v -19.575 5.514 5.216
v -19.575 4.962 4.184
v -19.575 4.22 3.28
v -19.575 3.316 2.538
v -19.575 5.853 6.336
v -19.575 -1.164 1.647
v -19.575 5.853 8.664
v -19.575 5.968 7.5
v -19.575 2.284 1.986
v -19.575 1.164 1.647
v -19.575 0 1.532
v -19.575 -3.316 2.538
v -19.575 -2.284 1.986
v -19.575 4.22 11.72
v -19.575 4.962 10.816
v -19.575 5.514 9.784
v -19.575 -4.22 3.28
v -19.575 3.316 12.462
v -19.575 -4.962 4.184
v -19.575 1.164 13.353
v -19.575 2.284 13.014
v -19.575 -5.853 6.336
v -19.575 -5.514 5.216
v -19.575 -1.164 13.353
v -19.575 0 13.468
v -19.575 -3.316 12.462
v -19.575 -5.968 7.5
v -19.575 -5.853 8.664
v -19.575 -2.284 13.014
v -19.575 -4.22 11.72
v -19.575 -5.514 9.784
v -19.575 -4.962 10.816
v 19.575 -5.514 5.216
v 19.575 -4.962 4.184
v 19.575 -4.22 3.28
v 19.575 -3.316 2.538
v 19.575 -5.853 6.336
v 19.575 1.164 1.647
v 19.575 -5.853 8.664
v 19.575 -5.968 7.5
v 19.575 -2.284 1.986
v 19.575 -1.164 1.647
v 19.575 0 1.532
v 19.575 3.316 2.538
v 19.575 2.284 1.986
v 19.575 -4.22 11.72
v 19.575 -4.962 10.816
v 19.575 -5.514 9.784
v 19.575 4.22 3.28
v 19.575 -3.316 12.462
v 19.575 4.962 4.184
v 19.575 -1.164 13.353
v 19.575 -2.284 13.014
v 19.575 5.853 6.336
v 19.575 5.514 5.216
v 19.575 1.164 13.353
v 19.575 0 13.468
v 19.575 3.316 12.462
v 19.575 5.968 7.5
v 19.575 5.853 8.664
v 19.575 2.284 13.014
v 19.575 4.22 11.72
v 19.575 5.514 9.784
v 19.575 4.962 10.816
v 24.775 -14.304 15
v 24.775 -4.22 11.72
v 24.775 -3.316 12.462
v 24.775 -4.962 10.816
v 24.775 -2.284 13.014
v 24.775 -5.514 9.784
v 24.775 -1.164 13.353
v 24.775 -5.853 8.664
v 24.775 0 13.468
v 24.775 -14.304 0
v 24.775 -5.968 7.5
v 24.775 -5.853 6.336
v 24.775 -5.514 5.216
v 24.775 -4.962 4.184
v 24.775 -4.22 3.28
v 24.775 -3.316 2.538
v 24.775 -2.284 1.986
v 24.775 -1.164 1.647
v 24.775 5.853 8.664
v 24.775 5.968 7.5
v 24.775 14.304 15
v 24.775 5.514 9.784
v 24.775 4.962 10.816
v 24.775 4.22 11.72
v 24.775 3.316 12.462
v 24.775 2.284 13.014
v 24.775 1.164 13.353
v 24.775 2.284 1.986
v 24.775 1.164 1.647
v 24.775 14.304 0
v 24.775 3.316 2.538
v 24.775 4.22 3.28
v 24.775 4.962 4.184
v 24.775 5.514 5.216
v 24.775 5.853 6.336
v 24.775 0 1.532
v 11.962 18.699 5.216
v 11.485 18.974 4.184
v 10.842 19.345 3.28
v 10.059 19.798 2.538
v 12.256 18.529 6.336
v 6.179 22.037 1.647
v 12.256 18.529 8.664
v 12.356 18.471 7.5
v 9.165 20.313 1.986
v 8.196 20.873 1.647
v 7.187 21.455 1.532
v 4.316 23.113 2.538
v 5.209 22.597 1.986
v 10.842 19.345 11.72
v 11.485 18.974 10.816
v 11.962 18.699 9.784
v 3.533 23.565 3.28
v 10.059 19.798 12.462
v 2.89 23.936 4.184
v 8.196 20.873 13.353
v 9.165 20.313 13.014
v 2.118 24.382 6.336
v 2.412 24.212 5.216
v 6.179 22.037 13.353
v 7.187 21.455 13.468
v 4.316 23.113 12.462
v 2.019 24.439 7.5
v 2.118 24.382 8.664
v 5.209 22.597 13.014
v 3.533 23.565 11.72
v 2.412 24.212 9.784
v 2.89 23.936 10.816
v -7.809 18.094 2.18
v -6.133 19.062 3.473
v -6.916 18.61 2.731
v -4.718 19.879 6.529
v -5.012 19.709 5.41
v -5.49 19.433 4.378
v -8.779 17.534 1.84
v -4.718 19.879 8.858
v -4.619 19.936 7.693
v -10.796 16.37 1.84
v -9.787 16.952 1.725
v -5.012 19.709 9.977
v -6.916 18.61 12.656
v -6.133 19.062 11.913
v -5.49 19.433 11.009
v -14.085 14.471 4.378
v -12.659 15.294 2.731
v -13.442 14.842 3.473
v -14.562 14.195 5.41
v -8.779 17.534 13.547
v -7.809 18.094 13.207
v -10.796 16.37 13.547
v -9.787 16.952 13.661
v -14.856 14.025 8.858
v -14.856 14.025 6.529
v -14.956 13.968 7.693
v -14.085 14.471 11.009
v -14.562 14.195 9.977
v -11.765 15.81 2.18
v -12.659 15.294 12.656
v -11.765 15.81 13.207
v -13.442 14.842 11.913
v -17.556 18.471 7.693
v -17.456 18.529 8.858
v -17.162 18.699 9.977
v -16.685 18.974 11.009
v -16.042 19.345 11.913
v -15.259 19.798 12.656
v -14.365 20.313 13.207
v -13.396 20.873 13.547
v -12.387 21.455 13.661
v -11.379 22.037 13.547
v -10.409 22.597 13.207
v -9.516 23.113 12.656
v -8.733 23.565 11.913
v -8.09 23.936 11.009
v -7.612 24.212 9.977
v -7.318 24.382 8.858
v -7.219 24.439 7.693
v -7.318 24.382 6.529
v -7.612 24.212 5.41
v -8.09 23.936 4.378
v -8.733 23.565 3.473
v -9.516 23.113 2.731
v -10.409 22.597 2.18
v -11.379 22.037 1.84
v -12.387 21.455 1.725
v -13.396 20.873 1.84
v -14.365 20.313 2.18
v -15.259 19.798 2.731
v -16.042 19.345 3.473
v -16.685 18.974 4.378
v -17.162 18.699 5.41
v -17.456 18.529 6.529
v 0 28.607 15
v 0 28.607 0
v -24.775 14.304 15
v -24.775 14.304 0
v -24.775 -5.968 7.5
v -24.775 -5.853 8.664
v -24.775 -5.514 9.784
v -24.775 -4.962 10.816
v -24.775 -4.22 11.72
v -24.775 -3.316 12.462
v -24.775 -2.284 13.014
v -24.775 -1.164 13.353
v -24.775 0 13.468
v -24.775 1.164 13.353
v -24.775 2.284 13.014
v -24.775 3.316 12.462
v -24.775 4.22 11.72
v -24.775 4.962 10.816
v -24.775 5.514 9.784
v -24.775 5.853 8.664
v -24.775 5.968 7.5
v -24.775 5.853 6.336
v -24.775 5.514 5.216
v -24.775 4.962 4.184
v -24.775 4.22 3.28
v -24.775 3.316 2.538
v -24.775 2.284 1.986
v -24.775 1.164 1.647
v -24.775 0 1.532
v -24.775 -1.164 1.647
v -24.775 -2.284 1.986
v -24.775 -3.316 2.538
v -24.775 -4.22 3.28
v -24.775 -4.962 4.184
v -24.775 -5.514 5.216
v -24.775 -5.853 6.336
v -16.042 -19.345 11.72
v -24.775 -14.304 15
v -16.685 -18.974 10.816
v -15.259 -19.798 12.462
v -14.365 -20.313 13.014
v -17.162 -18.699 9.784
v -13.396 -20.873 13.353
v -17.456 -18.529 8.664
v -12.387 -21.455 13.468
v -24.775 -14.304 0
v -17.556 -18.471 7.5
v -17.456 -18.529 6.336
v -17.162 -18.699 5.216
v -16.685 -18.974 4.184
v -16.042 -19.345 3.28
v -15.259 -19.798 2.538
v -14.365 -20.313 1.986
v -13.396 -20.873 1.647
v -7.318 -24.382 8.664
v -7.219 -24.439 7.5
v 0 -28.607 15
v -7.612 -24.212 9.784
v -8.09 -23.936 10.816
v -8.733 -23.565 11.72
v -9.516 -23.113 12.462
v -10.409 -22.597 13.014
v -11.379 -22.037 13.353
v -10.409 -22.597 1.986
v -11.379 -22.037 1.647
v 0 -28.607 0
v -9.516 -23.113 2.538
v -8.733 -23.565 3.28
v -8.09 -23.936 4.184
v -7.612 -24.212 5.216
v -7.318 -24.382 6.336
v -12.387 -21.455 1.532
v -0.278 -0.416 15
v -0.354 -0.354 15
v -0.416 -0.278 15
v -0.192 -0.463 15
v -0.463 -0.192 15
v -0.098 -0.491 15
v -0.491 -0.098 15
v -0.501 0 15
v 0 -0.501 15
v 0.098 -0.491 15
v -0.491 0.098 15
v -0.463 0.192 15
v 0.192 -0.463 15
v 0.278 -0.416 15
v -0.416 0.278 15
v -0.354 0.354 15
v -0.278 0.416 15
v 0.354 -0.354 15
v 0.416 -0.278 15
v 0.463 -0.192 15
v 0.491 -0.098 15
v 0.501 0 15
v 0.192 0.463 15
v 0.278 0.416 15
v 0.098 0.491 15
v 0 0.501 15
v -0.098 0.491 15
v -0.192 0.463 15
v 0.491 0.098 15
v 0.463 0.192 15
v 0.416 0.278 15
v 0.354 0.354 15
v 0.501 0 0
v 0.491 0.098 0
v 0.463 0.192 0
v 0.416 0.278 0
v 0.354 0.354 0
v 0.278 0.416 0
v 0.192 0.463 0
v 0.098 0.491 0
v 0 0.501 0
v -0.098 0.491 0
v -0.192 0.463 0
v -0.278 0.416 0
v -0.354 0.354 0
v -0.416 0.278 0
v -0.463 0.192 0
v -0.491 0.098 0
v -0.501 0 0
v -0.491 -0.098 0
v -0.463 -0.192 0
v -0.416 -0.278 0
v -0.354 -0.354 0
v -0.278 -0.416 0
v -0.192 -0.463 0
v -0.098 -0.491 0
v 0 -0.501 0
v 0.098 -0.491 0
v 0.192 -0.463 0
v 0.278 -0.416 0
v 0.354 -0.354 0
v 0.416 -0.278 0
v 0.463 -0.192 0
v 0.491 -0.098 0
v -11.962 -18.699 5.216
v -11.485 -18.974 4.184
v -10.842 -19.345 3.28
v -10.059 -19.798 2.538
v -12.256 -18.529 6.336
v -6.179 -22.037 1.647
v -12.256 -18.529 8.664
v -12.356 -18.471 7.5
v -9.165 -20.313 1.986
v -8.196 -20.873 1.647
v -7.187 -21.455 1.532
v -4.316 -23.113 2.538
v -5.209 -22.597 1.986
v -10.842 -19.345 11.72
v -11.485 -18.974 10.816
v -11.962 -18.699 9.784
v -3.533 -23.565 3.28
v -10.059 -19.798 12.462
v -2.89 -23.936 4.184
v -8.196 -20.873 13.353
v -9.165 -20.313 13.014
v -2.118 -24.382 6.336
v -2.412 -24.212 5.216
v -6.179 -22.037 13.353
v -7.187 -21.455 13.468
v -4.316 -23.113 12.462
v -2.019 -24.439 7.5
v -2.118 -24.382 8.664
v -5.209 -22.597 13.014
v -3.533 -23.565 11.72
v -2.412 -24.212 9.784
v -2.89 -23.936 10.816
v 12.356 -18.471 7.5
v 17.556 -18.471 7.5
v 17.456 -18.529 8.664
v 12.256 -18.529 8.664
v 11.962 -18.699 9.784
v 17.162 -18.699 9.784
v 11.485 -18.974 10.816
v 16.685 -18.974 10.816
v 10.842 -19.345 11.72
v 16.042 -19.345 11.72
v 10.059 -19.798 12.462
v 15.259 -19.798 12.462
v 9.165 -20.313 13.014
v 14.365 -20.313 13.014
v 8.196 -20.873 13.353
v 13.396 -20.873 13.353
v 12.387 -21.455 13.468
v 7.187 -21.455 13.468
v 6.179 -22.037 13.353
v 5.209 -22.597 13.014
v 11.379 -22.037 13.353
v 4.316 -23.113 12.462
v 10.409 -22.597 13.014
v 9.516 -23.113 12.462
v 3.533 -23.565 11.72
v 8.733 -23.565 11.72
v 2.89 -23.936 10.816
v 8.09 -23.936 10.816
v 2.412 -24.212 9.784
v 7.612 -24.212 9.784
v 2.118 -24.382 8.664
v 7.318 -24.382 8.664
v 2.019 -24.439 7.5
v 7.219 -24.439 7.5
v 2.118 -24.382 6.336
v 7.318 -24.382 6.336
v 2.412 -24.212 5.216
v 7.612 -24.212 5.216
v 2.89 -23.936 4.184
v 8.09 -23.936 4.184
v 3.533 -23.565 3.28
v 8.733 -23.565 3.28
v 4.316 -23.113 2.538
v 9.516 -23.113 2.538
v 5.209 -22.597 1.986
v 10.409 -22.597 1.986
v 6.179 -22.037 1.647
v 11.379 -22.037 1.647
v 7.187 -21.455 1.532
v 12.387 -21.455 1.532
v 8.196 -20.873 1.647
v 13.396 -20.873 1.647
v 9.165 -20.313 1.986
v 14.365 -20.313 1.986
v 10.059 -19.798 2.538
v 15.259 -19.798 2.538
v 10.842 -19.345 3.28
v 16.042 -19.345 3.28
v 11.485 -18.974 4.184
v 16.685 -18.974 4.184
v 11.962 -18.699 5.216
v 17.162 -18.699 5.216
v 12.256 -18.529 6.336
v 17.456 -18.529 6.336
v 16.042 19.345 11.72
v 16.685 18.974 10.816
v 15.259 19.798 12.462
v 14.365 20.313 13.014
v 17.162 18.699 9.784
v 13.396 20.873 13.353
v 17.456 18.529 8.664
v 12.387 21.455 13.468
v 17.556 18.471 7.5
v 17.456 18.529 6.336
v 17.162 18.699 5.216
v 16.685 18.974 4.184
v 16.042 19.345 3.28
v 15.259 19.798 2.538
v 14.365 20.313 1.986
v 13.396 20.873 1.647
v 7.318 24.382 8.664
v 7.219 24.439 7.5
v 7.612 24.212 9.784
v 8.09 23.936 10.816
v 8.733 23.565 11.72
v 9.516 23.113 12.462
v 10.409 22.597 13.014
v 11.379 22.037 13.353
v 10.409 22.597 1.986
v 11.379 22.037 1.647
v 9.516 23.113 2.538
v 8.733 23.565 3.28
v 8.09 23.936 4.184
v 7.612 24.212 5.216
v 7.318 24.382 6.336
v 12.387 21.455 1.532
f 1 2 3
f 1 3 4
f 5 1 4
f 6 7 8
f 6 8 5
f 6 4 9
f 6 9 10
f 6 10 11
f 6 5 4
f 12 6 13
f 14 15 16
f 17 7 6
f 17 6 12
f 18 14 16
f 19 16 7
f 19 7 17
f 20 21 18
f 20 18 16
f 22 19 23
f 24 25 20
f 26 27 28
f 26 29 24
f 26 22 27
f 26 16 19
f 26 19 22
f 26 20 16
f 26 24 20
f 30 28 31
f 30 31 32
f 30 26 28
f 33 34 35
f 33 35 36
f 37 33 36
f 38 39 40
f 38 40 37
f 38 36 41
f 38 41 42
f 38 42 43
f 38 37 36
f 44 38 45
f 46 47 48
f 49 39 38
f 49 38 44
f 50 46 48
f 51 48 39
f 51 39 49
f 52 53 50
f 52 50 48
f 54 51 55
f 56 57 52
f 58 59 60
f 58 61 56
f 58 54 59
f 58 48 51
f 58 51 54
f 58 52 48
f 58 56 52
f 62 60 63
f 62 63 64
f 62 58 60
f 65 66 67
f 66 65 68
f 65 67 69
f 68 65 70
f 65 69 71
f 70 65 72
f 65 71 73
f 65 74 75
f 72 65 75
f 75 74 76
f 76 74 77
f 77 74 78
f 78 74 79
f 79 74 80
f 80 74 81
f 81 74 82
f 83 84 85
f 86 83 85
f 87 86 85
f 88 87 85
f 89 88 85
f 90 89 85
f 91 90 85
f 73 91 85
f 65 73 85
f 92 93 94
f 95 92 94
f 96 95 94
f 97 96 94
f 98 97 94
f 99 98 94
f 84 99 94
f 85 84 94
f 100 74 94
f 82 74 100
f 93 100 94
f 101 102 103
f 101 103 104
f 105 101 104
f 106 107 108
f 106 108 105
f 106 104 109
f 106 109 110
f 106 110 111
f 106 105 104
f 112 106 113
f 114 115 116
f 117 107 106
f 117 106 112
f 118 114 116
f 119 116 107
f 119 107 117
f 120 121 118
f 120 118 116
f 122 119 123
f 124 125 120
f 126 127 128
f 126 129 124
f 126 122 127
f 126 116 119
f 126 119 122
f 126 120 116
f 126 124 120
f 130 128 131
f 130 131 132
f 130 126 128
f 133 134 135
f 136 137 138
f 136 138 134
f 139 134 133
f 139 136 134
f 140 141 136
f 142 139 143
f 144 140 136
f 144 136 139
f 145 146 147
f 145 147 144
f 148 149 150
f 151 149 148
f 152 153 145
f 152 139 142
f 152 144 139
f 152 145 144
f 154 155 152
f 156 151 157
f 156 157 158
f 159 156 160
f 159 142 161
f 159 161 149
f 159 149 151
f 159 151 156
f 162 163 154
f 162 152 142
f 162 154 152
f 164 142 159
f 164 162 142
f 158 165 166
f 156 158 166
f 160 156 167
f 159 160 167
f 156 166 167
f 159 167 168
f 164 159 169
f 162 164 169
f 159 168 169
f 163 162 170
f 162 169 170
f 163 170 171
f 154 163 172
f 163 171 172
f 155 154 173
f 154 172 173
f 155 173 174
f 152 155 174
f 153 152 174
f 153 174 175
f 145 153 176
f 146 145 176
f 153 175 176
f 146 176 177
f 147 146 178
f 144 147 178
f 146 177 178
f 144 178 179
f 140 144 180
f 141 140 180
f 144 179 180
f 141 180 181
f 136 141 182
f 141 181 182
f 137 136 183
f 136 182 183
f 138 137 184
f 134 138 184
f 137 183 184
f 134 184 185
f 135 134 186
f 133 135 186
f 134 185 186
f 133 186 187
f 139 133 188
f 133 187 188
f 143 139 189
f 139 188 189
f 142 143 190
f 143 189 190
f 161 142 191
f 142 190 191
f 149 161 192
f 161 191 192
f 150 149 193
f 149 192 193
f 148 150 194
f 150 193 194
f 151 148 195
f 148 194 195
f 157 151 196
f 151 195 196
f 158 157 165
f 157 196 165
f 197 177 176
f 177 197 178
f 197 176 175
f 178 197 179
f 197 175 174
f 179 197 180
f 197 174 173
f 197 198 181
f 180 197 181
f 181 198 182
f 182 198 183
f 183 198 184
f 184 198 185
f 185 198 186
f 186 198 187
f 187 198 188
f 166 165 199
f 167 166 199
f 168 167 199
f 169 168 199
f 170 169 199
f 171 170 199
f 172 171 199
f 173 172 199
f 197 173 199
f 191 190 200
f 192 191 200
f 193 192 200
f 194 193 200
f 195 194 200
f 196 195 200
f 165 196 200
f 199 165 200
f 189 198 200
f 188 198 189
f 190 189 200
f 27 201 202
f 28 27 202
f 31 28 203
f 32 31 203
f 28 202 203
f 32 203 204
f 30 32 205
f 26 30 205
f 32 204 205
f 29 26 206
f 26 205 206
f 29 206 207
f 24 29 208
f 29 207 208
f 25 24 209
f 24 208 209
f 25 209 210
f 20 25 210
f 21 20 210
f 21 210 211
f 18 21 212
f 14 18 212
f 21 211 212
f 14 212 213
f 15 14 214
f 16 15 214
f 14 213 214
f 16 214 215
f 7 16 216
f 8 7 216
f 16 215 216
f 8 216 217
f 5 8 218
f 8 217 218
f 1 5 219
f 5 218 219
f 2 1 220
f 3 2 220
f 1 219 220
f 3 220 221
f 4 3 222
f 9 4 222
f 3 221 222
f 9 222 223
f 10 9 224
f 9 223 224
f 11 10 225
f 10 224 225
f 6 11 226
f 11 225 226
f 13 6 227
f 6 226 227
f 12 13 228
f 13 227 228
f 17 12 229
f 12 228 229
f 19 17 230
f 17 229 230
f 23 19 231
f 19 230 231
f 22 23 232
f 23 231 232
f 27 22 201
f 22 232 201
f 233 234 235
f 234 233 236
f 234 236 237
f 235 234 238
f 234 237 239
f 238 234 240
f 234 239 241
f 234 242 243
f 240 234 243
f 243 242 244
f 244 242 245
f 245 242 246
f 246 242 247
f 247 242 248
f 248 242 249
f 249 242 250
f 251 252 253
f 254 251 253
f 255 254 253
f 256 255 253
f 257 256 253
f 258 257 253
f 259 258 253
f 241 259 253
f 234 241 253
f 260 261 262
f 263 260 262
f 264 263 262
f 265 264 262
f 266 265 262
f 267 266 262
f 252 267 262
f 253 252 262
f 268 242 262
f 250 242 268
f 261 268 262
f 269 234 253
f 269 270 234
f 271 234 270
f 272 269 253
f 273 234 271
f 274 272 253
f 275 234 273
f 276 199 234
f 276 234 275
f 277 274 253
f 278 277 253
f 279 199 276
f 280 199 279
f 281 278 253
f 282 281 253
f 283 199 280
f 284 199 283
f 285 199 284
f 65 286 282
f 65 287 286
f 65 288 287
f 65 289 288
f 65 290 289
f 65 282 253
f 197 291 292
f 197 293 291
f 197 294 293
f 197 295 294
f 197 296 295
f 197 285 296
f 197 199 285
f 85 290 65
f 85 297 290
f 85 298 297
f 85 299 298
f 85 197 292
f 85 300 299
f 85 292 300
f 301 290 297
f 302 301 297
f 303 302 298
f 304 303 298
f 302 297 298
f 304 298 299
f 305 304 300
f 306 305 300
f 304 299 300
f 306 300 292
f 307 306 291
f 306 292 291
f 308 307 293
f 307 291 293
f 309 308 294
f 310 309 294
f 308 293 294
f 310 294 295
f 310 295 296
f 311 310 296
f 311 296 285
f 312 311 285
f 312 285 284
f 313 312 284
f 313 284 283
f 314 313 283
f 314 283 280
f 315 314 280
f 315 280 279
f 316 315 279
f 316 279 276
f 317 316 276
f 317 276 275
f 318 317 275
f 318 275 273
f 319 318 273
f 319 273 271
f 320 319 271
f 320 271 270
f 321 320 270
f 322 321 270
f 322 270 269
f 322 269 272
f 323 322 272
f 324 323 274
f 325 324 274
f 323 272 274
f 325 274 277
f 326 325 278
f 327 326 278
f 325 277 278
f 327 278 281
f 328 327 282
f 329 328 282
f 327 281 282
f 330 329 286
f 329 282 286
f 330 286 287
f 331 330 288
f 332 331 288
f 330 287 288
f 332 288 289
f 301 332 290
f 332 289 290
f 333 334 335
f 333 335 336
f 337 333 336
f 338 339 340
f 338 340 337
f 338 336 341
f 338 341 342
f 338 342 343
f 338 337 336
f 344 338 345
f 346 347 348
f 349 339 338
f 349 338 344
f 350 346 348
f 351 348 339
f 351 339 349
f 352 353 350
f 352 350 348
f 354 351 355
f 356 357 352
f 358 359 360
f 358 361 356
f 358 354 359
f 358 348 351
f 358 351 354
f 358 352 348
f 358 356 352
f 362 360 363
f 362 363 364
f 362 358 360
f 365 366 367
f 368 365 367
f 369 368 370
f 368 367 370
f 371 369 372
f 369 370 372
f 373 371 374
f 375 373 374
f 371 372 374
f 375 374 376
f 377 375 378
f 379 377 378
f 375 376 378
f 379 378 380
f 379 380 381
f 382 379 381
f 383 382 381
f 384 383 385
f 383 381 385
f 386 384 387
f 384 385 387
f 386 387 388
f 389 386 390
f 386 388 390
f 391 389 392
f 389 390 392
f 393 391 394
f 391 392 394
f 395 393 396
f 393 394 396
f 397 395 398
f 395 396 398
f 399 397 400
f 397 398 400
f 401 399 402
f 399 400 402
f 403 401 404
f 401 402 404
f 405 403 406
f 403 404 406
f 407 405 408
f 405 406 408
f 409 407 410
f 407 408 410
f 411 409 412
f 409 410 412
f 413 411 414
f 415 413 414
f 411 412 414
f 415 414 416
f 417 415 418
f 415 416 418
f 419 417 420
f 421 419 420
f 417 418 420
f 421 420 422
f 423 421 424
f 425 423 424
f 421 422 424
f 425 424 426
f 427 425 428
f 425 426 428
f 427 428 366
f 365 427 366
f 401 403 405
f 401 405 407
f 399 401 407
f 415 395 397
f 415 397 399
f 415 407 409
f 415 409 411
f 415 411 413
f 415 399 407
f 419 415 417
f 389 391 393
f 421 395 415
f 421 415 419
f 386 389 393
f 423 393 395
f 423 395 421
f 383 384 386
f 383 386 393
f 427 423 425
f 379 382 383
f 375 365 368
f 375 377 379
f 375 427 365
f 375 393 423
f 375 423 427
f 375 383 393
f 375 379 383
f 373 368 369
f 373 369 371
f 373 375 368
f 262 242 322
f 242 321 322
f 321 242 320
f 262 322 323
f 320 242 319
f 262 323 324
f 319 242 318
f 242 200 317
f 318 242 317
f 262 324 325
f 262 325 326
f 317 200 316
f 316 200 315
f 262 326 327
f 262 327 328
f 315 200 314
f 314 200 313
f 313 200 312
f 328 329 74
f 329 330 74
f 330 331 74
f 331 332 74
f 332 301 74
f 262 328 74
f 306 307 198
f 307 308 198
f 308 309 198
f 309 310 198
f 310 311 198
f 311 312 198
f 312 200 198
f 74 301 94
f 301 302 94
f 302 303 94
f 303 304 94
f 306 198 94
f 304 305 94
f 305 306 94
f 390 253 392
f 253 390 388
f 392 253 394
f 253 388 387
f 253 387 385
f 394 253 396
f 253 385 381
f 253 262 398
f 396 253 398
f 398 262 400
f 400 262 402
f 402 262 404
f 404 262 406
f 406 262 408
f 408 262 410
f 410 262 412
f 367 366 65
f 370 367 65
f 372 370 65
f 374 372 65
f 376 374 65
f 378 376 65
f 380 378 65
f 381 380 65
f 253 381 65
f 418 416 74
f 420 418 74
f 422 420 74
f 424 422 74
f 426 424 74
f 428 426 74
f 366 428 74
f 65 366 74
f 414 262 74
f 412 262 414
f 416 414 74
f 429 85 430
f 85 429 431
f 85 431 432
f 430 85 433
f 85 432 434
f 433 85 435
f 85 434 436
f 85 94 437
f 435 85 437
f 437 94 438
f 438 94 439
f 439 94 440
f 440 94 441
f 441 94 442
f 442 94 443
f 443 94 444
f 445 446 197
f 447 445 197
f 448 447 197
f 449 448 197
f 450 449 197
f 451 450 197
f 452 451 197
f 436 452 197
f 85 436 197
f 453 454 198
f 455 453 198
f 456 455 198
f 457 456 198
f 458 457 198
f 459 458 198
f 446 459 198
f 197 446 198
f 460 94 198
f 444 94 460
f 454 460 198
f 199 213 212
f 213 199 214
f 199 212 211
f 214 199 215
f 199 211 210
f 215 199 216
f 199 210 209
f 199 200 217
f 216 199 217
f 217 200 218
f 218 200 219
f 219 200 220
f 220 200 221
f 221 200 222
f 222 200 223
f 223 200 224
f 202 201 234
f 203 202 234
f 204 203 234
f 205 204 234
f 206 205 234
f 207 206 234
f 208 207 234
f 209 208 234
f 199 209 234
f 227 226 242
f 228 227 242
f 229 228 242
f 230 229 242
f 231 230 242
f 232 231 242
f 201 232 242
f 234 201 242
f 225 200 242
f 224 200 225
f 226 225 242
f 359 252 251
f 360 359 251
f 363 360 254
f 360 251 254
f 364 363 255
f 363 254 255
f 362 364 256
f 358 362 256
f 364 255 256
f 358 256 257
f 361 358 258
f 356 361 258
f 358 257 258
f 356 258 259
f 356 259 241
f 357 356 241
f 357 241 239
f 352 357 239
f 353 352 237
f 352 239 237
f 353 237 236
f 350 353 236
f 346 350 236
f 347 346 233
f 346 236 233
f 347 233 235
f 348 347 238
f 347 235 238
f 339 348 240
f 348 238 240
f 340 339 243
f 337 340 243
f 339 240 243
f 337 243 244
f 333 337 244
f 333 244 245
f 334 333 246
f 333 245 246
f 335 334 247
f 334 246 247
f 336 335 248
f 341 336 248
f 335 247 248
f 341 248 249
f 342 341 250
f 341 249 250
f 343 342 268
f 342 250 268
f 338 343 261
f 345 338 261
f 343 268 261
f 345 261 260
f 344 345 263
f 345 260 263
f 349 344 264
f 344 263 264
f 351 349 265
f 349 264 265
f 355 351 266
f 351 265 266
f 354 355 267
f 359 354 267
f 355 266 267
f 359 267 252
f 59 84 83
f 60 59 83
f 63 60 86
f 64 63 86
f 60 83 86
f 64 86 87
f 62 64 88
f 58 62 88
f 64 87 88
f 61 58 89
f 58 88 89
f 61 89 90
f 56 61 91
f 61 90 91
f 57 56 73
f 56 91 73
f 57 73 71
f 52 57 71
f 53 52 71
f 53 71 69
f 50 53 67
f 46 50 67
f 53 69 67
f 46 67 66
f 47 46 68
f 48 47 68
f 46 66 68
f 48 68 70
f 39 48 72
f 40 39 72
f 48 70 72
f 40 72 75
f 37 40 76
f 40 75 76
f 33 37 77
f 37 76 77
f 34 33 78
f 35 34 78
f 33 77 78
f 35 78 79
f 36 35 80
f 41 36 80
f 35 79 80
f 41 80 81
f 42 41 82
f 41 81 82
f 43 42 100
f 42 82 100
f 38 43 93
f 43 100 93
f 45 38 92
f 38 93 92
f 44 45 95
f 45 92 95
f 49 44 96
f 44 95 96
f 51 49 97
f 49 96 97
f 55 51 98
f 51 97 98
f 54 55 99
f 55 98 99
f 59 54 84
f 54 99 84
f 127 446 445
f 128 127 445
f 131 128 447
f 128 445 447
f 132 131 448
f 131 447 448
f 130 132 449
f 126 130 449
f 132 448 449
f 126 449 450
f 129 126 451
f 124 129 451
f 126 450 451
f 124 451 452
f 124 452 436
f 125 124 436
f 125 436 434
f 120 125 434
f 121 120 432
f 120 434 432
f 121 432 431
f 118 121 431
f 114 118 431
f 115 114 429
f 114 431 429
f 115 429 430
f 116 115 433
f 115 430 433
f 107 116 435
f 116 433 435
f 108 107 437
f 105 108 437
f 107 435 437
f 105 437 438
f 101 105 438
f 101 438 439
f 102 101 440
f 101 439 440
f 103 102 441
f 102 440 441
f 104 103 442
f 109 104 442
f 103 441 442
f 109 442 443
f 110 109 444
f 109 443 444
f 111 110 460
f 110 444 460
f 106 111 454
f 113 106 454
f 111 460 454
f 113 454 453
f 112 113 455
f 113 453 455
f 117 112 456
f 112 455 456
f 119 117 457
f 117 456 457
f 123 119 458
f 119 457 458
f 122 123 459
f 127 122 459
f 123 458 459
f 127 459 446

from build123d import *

# Parameters (mm, degrees)
F1_DEPTH  = 15
F2_R      = 5.9679112776
F3_DEPTH  = 5.2
F7_R      = 5.9679112776
F6_R      = 5.9679112776
F5_R      = 5.9679112776
F4_R      = 5.9679112776
F8_R      = 5.9679112776
F9_DEPTH  = 5.2
F10_R     = 5.9679112776
F11_R     = 5.9679112776
F12_DEPTH = 5.2
F13_R     = 0.5008771255
F14_DEPTH = 25


with BuildPart() as f1:
    # F0 (on Top) → F1 (new body)
    with BuildSketch(Plane.XY):
        Polygon((0, -28.6071354192), (24.7745060026, -14.3035677096), (24.7745060026, 14.3035677096), (0, 28.6071354192), (-24.7745060026, 14.3035677096), (-24.7745060026, -14.3035677096), align=None)
    extrude(amount=F1_DEPTH)

    # F2 (on face) → F3 (cut)
    with BuildSketch(Plane(origin=(-12.3872530013, 21.4553515644, 0), x_dir=(-0.8660254038, -0.5, 0), z_dir=(-0.5, 0.8660254038, 0))):
        with Locations((0, 7.6934061944)):
            Circle(F2_R)
    extrude(amount=-F3_DEPTH, mode=Mode.SUBTRACT)

    # F7 (on face) + F6 (on face) + F5 (on face) + F4 (on face) + F8 (on face) → F9 (cut)
    with BuildSketch(Plane.YZ.offset(24.7745060026)):
        with Locations((0, 7.5)):
            Circle(F7_R)
    with BuildSketch(Plane(origin=(12.3872530013, -21.4553515644, 0), x_dir=(0.8660254038, 0.5, 0), z_dir=(0.5, -0.8660254038, 0))):
        with Locations((0, 7.5)):
            Circle(F6_R)
    with BuildSketch(Plane(origin=(-12.3872530013, -21.4553515644, 0), x_dir=(0.8660254038, -0.5, 0), z_dir=(-0.5, -0.8660254038, 0))):
        with Locations((0, 7.5)):
            Circle(F5_R)
    with BuildSketch(Plane(origin=(-24.7745060026, 0, 0), x_dir=(0, -1, 0), z_dir=(-1, 0, 0))):
        with Locations((0, 7.5)):
            Circle(F4_R)
    with BuildSketch(Plane(origin=(12.3872530013, 21.4553515644, 0), x_dir=(-0.8660254038, 0.5, 0), z_dir=(0.5, 0.8660254038, 0))):
        with Locations((0, 7.5)):
            Circle(F8_R)
    extrude(amount=-F9_DEPTH, dir=(1, 0, 0), mode=Mode.SUBTRACT)

    # F10 (on face) + F11 (on face) → F12 (cut)
    with BuildSketch(Plane(origin=(-24.7745060026, 0, 0), x_dir=(0, -1, 0), z_dir=(-1, 0, 0))):
        with Locations((0, 7.5)):
            Circle(F10_R)
    with BuildSketch(Plane(origin=(-12.3872530013, -21.4553515644, 0), x_dir=(0.8660254038, -0.5, 0), z_dir=(-0.5, -0.8660254038, 0))):
        with Locations((0, 7.5)):
            Circle(F11_R)
    extrude(amount=-F12_DEPTH, dir=(-1, 0, 0), mode=Mode.SUBTRACT)

    # F13 (on face) → F14 (cut)
    with BuildSketch(Plane.XY.offset(15)):
        Circle(F13_R)
    extrude(amount=-F14_DEPTH, mode=Mode.SUBTRACT)


solid = f1.part
